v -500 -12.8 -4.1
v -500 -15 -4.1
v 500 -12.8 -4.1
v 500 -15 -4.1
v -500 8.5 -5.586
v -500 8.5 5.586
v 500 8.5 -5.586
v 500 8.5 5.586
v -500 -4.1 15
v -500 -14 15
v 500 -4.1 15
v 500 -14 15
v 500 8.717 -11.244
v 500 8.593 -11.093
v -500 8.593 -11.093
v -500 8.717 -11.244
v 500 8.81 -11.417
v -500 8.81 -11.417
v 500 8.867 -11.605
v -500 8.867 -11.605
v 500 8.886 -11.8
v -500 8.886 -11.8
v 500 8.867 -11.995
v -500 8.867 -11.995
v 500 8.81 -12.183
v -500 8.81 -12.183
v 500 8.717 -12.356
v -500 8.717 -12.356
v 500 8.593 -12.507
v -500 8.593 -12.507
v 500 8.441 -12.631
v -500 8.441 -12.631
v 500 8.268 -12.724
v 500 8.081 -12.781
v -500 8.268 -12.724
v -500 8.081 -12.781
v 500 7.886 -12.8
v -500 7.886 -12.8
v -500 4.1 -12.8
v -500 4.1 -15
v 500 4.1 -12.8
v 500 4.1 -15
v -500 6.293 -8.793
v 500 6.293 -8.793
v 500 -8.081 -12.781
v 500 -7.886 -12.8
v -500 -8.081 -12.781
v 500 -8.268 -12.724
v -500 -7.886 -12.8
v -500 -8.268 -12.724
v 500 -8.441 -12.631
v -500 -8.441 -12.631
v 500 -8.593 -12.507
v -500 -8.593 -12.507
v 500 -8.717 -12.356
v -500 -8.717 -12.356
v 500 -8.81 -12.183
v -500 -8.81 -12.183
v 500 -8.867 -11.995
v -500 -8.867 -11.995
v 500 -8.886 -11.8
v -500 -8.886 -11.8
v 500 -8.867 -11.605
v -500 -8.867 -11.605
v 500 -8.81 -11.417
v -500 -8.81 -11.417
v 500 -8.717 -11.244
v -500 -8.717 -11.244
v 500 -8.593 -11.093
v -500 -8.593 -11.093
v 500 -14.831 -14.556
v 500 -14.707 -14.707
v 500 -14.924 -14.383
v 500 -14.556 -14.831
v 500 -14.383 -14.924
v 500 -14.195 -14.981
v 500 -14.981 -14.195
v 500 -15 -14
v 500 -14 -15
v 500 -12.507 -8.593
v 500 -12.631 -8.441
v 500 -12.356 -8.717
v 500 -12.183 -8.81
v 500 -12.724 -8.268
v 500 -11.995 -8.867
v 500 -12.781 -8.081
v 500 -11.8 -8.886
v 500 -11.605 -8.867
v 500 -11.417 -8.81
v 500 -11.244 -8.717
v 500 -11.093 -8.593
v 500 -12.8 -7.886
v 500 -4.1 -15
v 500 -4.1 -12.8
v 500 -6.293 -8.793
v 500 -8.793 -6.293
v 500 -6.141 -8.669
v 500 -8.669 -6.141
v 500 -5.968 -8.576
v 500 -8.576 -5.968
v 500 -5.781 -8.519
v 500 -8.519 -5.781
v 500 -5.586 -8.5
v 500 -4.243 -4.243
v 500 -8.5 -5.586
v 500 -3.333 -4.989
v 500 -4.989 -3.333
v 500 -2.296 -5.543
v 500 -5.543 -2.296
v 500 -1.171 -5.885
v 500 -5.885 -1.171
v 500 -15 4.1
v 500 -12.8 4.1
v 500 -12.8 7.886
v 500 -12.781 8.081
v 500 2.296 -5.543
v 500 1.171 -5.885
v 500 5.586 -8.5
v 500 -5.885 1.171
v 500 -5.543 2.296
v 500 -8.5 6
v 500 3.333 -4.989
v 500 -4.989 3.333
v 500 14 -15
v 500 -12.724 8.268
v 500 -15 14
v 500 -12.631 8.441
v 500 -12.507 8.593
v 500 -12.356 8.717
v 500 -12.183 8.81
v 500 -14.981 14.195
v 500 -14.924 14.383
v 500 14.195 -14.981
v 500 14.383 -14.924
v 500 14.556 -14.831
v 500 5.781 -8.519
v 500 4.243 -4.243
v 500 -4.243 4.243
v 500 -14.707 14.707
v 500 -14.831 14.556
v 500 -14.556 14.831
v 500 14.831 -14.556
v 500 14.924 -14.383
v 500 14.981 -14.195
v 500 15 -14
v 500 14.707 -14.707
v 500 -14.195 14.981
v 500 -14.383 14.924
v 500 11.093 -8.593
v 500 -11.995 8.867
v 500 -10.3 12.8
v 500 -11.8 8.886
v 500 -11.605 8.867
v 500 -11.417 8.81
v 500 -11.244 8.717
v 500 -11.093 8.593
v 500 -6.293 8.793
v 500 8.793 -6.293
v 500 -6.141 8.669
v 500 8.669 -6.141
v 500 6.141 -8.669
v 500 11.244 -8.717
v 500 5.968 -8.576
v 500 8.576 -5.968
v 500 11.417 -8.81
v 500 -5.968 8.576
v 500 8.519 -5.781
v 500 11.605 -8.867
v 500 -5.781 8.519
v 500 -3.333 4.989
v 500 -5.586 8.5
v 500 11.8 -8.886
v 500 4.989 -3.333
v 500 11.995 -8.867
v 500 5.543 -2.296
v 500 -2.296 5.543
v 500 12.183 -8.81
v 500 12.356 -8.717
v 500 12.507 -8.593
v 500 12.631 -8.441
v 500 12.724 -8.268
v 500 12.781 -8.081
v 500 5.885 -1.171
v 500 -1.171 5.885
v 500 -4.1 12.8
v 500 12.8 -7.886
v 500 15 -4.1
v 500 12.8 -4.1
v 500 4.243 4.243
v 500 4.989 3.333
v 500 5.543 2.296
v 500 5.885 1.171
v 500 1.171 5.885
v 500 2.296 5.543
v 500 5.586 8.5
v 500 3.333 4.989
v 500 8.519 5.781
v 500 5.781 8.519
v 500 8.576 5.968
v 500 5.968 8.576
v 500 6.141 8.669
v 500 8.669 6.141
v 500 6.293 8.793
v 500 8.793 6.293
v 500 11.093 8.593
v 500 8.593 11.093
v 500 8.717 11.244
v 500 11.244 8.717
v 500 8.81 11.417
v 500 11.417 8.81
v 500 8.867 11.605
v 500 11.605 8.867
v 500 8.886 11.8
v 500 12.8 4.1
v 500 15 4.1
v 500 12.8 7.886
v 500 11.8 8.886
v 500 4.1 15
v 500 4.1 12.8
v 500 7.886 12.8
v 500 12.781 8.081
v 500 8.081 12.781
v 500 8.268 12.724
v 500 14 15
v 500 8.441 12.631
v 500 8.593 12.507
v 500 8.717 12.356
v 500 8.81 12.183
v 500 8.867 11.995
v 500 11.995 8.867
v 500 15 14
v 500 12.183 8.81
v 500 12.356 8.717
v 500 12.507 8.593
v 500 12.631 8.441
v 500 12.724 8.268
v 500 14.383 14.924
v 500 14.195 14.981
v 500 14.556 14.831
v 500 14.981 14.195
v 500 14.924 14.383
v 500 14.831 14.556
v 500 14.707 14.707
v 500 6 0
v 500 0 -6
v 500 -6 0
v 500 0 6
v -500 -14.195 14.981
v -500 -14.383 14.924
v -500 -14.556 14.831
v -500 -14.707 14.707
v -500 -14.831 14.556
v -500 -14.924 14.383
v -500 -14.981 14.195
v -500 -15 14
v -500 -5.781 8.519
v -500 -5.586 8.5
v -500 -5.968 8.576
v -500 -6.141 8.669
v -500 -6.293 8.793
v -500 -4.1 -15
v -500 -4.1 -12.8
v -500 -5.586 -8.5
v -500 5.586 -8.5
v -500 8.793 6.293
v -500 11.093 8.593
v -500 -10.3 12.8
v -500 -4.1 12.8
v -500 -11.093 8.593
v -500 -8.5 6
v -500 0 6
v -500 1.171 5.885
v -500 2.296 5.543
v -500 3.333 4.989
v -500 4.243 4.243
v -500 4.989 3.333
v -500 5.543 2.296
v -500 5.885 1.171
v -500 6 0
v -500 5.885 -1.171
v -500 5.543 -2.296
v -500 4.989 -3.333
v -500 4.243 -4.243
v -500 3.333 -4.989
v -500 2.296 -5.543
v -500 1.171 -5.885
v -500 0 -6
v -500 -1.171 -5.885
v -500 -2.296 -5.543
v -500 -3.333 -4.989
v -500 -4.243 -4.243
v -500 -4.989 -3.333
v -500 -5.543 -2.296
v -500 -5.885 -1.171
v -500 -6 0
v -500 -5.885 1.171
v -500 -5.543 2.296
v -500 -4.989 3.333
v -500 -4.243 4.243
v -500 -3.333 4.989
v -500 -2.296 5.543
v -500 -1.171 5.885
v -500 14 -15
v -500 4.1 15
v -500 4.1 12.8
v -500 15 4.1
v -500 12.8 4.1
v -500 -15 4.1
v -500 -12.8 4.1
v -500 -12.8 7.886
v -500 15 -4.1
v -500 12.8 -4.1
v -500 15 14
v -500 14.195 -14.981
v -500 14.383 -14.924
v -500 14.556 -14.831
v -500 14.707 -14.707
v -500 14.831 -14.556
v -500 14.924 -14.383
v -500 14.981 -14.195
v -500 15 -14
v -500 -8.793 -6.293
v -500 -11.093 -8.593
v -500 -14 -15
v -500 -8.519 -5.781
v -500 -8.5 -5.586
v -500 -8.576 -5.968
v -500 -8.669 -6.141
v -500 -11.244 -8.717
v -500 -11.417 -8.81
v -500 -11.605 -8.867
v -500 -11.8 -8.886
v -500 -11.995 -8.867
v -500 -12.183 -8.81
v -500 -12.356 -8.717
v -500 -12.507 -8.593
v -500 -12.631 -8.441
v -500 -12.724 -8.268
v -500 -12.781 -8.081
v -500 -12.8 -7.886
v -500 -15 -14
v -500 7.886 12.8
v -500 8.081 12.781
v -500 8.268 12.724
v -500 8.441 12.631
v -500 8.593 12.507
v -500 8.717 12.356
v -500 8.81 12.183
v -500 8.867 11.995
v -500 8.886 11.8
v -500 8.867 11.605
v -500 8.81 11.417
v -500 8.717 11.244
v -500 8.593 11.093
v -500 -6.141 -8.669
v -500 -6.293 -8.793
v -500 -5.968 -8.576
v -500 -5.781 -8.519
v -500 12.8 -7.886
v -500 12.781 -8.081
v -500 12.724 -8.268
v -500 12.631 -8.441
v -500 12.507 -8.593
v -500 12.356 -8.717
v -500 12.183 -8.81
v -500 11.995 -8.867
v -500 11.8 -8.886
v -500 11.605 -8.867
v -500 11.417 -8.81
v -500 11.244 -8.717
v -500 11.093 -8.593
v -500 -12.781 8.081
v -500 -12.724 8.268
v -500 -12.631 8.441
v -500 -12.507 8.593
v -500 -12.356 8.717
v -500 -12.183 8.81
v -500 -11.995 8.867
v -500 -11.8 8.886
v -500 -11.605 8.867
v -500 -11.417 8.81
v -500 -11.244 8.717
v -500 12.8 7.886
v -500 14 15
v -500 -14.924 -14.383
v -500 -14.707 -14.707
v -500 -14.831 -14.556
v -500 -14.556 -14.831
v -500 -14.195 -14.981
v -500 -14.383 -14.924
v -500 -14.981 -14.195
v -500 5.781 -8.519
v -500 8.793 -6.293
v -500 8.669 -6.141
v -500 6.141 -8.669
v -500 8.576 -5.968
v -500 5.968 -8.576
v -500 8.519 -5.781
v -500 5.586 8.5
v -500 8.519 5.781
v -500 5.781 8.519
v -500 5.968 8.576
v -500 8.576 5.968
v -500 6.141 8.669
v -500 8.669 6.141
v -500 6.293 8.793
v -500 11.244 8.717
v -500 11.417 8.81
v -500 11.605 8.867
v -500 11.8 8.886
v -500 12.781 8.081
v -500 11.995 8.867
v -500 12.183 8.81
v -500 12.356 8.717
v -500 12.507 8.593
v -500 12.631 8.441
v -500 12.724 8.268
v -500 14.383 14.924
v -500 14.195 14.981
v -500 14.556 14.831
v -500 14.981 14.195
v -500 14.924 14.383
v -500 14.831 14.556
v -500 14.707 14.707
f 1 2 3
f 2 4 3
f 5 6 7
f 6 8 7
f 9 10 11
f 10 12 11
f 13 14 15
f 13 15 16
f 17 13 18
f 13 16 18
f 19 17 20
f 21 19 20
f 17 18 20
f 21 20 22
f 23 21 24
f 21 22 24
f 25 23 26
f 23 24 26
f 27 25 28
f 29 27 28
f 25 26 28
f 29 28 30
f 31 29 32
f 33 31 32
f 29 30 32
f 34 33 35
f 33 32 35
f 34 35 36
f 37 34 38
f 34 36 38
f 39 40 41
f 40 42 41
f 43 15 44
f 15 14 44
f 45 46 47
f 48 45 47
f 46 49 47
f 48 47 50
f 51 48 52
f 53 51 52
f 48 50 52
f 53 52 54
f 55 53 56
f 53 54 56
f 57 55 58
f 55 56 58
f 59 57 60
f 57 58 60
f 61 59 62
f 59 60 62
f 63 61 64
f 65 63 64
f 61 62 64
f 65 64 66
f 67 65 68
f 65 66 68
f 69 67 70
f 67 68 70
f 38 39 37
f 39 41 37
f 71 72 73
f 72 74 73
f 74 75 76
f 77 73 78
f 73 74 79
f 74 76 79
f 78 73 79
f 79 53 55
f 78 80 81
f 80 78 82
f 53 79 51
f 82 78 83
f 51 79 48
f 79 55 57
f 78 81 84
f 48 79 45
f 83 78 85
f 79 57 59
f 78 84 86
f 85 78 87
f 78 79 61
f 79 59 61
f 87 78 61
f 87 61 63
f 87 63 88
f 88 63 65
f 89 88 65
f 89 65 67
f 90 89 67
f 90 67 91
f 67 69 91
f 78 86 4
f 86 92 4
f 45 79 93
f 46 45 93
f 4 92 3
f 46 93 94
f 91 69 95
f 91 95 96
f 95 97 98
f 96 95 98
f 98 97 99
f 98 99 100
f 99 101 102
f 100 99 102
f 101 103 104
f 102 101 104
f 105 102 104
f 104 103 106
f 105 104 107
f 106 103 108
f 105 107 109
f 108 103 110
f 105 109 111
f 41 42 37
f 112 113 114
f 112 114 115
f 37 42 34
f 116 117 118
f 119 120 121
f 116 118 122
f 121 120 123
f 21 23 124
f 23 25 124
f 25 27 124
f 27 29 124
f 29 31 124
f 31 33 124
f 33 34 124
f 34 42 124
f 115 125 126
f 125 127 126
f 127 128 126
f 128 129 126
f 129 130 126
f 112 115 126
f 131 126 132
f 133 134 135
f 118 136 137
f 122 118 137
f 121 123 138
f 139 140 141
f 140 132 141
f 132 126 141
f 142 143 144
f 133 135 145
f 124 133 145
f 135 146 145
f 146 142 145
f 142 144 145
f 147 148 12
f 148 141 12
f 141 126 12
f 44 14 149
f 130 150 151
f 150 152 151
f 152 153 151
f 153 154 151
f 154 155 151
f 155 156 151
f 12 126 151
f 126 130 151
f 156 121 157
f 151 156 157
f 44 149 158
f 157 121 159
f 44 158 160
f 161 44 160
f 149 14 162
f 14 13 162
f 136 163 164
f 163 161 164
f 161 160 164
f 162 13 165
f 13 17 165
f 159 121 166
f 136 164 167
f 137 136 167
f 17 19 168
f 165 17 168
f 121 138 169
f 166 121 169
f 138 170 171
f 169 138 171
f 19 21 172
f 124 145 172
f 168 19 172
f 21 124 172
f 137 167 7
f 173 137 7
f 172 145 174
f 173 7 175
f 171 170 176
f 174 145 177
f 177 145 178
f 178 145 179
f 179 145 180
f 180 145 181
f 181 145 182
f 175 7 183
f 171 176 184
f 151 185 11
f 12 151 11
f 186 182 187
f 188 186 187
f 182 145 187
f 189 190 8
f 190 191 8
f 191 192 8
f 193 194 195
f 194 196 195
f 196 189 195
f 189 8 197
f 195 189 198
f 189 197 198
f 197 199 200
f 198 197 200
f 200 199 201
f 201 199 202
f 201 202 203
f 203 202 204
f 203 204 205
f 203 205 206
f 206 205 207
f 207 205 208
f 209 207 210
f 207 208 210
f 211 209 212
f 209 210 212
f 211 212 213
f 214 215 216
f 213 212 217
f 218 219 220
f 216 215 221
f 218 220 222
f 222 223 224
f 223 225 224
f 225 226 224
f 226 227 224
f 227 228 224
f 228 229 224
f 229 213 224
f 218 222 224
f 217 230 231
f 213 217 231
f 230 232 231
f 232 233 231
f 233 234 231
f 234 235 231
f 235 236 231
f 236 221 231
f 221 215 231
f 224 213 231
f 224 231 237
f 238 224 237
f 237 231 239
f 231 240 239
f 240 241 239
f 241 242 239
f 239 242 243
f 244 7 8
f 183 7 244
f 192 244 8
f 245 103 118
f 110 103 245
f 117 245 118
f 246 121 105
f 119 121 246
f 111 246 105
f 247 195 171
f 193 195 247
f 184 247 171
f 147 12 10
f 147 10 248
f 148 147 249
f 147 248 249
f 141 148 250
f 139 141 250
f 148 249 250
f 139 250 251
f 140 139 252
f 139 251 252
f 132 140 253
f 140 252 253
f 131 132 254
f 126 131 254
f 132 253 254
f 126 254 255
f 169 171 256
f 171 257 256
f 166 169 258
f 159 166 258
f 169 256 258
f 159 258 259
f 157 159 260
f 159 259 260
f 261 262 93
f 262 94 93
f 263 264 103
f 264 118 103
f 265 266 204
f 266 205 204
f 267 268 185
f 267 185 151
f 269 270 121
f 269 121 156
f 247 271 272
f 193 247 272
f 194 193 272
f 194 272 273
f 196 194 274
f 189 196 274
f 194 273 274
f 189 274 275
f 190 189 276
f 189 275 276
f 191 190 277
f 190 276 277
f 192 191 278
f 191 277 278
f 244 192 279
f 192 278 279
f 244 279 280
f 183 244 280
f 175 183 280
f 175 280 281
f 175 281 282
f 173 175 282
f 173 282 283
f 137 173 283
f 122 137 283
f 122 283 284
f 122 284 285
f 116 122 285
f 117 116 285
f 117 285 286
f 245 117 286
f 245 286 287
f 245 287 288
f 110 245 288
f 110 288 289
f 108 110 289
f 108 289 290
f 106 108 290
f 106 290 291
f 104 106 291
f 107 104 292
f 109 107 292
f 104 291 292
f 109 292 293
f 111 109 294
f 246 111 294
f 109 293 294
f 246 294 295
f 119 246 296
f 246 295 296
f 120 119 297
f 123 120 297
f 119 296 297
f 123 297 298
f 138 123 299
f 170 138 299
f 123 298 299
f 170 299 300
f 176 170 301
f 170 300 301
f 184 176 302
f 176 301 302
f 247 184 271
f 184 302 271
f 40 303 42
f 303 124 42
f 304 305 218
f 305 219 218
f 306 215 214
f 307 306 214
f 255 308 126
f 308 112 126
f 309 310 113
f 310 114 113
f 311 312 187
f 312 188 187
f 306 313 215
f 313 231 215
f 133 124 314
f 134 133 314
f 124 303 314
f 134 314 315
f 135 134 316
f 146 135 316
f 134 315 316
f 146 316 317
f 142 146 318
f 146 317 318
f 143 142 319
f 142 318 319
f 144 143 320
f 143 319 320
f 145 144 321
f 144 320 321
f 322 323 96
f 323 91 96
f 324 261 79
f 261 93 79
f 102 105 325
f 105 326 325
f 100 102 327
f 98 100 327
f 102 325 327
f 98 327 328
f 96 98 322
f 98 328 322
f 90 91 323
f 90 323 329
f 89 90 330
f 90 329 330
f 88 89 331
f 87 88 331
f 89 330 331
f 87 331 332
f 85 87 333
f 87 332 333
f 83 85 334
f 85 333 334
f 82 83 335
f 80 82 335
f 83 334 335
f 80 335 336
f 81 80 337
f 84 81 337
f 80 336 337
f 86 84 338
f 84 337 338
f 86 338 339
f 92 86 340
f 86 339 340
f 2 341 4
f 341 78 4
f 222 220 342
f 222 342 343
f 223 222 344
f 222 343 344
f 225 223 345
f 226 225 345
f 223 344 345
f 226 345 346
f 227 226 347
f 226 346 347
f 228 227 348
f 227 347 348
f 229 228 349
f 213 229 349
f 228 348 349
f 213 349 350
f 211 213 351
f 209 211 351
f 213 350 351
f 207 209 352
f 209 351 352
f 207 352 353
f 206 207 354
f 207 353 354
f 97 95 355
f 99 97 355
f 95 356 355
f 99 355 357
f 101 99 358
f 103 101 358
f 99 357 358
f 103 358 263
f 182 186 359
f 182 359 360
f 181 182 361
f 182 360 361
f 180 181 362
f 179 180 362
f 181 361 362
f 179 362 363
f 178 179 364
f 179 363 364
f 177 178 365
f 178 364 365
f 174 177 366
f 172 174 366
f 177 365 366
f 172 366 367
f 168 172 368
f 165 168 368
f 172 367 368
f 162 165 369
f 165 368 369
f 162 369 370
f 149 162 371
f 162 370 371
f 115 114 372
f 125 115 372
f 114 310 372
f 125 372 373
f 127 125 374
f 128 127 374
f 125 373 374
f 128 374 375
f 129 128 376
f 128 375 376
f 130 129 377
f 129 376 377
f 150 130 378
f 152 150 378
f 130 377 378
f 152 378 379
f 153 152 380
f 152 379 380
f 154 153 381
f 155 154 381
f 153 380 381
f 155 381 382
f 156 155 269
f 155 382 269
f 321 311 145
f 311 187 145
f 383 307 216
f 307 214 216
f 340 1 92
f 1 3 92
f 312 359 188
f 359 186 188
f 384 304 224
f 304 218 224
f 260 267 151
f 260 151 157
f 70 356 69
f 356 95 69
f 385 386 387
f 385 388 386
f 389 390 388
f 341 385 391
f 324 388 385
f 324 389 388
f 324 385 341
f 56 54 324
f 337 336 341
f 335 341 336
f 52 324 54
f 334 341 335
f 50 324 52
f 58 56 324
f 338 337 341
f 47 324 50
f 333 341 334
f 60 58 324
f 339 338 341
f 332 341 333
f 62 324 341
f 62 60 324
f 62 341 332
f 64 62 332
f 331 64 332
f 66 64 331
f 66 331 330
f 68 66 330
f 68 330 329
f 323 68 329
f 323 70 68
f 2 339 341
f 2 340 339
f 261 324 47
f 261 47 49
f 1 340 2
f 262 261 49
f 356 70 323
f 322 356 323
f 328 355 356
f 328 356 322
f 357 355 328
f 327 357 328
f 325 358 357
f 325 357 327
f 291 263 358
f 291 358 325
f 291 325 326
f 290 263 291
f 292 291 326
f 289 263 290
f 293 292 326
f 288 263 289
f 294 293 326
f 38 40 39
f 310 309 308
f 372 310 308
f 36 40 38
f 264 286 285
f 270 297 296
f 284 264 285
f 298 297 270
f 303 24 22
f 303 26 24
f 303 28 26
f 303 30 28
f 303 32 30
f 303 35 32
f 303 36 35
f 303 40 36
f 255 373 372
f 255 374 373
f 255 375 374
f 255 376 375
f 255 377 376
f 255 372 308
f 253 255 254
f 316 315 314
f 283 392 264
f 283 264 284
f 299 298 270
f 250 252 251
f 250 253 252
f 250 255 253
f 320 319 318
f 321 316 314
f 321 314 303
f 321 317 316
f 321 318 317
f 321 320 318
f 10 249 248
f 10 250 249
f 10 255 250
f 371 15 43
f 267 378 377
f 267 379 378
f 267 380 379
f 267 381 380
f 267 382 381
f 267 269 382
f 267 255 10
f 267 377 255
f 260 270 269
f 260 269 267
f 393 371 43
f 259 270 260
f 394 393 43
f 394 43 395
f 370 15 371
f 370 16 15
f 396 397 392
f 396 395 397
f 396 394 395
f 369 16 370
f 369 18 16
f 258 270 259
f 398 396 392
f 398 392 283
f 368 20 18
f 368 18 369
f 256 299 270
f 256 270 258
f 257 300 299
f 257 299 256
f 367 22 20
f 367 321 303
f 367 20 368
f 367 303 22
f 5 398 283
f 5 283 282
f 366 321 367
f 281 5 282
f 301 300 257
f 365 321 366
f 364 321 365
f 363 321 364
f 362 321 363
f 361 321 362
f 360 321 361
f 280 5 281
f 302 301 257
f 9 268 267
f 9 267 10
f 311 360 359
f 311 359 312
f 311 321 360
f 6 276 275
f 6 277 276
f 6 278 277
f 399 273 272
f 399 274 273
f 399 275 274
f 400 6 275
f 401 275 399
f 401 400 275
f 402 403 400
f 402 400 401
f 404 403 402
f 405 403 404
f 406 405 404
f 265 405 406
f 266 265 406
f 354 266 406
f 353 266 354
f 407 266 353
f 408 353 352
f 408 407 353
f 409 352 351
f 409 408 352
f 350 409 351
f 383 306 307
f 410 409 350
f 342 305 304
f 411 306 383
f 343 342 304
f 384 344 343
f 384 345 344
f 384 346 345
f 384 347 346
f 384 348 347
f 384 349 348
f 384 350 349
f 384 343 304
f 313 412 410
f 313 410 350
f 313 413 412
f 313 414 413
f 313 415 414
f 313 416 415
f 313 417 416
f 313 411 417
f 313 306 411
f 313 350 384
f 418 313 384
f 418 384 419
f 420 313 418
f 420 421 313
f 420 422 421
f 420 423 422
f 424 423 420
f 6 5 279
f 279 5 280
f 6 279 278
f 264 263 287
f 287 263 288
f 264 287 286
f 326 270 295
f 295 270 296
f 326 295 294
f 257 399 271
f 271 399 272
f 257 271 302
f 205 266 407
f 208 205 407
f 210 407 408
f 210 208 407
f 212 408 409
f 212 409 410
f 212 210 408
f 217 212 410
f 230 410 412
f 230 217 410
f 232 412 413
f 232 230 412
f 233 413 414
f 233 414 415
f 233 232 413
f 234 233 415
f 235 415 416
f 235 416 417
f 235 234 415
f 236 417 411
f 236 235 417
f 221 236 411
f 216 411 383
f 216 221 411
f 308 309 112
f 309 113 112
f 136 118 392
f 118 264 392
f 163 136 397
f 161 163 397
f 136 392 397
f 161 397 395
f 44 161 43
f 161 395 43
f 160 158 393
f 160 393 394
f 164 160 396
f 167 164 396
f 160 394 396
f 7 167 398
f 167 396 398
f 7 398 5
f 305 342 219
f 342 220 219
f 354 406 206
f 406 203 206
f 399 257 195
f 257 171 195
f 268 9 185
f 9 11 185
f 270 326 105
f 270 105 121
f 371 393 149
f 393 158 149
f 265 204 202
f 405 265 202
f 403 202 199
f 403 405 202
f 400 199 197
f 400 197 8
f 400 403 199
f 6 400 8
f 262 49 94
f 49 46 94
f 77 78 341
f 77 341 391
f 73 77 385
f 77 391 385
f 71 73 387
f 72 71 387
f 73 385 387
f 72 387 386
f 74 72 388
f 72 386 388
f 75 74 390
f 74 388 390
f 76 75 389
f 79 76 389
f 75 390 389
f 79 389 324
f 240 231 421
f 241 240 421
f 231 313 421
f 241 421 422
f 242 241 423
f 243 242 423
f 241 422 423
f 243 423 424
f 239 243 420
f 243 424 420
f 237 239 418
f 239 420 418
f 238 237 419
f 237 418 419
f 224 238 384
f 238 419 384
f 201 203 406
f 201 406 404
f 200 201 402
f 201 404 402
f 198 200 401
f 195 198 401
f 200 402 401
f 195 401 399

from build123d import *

# Parameters (mm, degrees)
BOSS_EXTRUDE2_DEPTH = 500
FILLET1_R           = 1
SKETCH2_R           = 6
CUT_EXTRUDE1_DEPTH  = 1001.224974693


with BuildPart() as part:
    # Sketch1 → Boss-Extrude2 (new, symmetric)
    with BuildSketch(Plane(origin=(0, 0, 0), x_dir=(0, 0, -1), z_dir=(1, 0, 0))):
        Polygon((-10.3, 12.8), (-6, 8.5), (6, 8.5), (10.3, 12.8), (4.1, 12.8), (4.1, 15), (15, 15), (15, 4.1), (12.8, 4.1), (12.8, 10.3), (8.5, 6), (8.5, -6), (12.8, -10.3), (12.8, -4.1), (15, -4.1), (15, -15), (4.1, -15), (4.1, -12.8), (10.3, -12.8), (6, -8.5), (-6, -8.5), (-10.3, -12.8), (-4.1, -12.8), (-4.1, -15), (-15, -15), (-15, -4.1), (-12.8, -4.1), (-12.8, -10.3), (-8.5, -6), (-8.5, 6), (-12.8, 10.3), (-12.8, 4.1), (-15, 4.1), (-15, 15), (-4.1, 15), (-4.1, 12.8), align=None)
    extrude(amount=BOSS_EXTRUDE2_DEPTH, both=True)

    # Fillet1
    fillet1_edges = [part.edges().sort_by_distance(p)[0] for p in [
        (0, 10.3, 12.8),
        (0, 6, 8.5),
        (0, -6, 8.5),
        (0, -15, 15),
        (0, -12.8, 10.3),
        (0, -8.5, -6),
        (0, -12.8, -10.3),
        (0, -15, -15),
        (0, -10.3, -12.8),
        (0, -6, -8.5),
        (0, 6, -8.5),
        (0, 10.3, -12.8),
        (0, 15, -15),
        (0, 12.8, -10.3),
        (0, 8.5, -6),
        (0, 8.5, 6),
        (0, 12.8, 10.3),
        (0, 15, 15),
    ]]
    fillet(fillet1_edges, radius=FILLET1_R)

    # Sketch2 → Cut-Extrude1 (cut, through all)
    with BuildSketch(Plane.ZY.offset(500)):
        Circle(SKETCH2_R)
    extrude(amount=-CUT_EXTRUDE1_DEPTH, mode=Mode.SUBTRACT)


solid = part.part
